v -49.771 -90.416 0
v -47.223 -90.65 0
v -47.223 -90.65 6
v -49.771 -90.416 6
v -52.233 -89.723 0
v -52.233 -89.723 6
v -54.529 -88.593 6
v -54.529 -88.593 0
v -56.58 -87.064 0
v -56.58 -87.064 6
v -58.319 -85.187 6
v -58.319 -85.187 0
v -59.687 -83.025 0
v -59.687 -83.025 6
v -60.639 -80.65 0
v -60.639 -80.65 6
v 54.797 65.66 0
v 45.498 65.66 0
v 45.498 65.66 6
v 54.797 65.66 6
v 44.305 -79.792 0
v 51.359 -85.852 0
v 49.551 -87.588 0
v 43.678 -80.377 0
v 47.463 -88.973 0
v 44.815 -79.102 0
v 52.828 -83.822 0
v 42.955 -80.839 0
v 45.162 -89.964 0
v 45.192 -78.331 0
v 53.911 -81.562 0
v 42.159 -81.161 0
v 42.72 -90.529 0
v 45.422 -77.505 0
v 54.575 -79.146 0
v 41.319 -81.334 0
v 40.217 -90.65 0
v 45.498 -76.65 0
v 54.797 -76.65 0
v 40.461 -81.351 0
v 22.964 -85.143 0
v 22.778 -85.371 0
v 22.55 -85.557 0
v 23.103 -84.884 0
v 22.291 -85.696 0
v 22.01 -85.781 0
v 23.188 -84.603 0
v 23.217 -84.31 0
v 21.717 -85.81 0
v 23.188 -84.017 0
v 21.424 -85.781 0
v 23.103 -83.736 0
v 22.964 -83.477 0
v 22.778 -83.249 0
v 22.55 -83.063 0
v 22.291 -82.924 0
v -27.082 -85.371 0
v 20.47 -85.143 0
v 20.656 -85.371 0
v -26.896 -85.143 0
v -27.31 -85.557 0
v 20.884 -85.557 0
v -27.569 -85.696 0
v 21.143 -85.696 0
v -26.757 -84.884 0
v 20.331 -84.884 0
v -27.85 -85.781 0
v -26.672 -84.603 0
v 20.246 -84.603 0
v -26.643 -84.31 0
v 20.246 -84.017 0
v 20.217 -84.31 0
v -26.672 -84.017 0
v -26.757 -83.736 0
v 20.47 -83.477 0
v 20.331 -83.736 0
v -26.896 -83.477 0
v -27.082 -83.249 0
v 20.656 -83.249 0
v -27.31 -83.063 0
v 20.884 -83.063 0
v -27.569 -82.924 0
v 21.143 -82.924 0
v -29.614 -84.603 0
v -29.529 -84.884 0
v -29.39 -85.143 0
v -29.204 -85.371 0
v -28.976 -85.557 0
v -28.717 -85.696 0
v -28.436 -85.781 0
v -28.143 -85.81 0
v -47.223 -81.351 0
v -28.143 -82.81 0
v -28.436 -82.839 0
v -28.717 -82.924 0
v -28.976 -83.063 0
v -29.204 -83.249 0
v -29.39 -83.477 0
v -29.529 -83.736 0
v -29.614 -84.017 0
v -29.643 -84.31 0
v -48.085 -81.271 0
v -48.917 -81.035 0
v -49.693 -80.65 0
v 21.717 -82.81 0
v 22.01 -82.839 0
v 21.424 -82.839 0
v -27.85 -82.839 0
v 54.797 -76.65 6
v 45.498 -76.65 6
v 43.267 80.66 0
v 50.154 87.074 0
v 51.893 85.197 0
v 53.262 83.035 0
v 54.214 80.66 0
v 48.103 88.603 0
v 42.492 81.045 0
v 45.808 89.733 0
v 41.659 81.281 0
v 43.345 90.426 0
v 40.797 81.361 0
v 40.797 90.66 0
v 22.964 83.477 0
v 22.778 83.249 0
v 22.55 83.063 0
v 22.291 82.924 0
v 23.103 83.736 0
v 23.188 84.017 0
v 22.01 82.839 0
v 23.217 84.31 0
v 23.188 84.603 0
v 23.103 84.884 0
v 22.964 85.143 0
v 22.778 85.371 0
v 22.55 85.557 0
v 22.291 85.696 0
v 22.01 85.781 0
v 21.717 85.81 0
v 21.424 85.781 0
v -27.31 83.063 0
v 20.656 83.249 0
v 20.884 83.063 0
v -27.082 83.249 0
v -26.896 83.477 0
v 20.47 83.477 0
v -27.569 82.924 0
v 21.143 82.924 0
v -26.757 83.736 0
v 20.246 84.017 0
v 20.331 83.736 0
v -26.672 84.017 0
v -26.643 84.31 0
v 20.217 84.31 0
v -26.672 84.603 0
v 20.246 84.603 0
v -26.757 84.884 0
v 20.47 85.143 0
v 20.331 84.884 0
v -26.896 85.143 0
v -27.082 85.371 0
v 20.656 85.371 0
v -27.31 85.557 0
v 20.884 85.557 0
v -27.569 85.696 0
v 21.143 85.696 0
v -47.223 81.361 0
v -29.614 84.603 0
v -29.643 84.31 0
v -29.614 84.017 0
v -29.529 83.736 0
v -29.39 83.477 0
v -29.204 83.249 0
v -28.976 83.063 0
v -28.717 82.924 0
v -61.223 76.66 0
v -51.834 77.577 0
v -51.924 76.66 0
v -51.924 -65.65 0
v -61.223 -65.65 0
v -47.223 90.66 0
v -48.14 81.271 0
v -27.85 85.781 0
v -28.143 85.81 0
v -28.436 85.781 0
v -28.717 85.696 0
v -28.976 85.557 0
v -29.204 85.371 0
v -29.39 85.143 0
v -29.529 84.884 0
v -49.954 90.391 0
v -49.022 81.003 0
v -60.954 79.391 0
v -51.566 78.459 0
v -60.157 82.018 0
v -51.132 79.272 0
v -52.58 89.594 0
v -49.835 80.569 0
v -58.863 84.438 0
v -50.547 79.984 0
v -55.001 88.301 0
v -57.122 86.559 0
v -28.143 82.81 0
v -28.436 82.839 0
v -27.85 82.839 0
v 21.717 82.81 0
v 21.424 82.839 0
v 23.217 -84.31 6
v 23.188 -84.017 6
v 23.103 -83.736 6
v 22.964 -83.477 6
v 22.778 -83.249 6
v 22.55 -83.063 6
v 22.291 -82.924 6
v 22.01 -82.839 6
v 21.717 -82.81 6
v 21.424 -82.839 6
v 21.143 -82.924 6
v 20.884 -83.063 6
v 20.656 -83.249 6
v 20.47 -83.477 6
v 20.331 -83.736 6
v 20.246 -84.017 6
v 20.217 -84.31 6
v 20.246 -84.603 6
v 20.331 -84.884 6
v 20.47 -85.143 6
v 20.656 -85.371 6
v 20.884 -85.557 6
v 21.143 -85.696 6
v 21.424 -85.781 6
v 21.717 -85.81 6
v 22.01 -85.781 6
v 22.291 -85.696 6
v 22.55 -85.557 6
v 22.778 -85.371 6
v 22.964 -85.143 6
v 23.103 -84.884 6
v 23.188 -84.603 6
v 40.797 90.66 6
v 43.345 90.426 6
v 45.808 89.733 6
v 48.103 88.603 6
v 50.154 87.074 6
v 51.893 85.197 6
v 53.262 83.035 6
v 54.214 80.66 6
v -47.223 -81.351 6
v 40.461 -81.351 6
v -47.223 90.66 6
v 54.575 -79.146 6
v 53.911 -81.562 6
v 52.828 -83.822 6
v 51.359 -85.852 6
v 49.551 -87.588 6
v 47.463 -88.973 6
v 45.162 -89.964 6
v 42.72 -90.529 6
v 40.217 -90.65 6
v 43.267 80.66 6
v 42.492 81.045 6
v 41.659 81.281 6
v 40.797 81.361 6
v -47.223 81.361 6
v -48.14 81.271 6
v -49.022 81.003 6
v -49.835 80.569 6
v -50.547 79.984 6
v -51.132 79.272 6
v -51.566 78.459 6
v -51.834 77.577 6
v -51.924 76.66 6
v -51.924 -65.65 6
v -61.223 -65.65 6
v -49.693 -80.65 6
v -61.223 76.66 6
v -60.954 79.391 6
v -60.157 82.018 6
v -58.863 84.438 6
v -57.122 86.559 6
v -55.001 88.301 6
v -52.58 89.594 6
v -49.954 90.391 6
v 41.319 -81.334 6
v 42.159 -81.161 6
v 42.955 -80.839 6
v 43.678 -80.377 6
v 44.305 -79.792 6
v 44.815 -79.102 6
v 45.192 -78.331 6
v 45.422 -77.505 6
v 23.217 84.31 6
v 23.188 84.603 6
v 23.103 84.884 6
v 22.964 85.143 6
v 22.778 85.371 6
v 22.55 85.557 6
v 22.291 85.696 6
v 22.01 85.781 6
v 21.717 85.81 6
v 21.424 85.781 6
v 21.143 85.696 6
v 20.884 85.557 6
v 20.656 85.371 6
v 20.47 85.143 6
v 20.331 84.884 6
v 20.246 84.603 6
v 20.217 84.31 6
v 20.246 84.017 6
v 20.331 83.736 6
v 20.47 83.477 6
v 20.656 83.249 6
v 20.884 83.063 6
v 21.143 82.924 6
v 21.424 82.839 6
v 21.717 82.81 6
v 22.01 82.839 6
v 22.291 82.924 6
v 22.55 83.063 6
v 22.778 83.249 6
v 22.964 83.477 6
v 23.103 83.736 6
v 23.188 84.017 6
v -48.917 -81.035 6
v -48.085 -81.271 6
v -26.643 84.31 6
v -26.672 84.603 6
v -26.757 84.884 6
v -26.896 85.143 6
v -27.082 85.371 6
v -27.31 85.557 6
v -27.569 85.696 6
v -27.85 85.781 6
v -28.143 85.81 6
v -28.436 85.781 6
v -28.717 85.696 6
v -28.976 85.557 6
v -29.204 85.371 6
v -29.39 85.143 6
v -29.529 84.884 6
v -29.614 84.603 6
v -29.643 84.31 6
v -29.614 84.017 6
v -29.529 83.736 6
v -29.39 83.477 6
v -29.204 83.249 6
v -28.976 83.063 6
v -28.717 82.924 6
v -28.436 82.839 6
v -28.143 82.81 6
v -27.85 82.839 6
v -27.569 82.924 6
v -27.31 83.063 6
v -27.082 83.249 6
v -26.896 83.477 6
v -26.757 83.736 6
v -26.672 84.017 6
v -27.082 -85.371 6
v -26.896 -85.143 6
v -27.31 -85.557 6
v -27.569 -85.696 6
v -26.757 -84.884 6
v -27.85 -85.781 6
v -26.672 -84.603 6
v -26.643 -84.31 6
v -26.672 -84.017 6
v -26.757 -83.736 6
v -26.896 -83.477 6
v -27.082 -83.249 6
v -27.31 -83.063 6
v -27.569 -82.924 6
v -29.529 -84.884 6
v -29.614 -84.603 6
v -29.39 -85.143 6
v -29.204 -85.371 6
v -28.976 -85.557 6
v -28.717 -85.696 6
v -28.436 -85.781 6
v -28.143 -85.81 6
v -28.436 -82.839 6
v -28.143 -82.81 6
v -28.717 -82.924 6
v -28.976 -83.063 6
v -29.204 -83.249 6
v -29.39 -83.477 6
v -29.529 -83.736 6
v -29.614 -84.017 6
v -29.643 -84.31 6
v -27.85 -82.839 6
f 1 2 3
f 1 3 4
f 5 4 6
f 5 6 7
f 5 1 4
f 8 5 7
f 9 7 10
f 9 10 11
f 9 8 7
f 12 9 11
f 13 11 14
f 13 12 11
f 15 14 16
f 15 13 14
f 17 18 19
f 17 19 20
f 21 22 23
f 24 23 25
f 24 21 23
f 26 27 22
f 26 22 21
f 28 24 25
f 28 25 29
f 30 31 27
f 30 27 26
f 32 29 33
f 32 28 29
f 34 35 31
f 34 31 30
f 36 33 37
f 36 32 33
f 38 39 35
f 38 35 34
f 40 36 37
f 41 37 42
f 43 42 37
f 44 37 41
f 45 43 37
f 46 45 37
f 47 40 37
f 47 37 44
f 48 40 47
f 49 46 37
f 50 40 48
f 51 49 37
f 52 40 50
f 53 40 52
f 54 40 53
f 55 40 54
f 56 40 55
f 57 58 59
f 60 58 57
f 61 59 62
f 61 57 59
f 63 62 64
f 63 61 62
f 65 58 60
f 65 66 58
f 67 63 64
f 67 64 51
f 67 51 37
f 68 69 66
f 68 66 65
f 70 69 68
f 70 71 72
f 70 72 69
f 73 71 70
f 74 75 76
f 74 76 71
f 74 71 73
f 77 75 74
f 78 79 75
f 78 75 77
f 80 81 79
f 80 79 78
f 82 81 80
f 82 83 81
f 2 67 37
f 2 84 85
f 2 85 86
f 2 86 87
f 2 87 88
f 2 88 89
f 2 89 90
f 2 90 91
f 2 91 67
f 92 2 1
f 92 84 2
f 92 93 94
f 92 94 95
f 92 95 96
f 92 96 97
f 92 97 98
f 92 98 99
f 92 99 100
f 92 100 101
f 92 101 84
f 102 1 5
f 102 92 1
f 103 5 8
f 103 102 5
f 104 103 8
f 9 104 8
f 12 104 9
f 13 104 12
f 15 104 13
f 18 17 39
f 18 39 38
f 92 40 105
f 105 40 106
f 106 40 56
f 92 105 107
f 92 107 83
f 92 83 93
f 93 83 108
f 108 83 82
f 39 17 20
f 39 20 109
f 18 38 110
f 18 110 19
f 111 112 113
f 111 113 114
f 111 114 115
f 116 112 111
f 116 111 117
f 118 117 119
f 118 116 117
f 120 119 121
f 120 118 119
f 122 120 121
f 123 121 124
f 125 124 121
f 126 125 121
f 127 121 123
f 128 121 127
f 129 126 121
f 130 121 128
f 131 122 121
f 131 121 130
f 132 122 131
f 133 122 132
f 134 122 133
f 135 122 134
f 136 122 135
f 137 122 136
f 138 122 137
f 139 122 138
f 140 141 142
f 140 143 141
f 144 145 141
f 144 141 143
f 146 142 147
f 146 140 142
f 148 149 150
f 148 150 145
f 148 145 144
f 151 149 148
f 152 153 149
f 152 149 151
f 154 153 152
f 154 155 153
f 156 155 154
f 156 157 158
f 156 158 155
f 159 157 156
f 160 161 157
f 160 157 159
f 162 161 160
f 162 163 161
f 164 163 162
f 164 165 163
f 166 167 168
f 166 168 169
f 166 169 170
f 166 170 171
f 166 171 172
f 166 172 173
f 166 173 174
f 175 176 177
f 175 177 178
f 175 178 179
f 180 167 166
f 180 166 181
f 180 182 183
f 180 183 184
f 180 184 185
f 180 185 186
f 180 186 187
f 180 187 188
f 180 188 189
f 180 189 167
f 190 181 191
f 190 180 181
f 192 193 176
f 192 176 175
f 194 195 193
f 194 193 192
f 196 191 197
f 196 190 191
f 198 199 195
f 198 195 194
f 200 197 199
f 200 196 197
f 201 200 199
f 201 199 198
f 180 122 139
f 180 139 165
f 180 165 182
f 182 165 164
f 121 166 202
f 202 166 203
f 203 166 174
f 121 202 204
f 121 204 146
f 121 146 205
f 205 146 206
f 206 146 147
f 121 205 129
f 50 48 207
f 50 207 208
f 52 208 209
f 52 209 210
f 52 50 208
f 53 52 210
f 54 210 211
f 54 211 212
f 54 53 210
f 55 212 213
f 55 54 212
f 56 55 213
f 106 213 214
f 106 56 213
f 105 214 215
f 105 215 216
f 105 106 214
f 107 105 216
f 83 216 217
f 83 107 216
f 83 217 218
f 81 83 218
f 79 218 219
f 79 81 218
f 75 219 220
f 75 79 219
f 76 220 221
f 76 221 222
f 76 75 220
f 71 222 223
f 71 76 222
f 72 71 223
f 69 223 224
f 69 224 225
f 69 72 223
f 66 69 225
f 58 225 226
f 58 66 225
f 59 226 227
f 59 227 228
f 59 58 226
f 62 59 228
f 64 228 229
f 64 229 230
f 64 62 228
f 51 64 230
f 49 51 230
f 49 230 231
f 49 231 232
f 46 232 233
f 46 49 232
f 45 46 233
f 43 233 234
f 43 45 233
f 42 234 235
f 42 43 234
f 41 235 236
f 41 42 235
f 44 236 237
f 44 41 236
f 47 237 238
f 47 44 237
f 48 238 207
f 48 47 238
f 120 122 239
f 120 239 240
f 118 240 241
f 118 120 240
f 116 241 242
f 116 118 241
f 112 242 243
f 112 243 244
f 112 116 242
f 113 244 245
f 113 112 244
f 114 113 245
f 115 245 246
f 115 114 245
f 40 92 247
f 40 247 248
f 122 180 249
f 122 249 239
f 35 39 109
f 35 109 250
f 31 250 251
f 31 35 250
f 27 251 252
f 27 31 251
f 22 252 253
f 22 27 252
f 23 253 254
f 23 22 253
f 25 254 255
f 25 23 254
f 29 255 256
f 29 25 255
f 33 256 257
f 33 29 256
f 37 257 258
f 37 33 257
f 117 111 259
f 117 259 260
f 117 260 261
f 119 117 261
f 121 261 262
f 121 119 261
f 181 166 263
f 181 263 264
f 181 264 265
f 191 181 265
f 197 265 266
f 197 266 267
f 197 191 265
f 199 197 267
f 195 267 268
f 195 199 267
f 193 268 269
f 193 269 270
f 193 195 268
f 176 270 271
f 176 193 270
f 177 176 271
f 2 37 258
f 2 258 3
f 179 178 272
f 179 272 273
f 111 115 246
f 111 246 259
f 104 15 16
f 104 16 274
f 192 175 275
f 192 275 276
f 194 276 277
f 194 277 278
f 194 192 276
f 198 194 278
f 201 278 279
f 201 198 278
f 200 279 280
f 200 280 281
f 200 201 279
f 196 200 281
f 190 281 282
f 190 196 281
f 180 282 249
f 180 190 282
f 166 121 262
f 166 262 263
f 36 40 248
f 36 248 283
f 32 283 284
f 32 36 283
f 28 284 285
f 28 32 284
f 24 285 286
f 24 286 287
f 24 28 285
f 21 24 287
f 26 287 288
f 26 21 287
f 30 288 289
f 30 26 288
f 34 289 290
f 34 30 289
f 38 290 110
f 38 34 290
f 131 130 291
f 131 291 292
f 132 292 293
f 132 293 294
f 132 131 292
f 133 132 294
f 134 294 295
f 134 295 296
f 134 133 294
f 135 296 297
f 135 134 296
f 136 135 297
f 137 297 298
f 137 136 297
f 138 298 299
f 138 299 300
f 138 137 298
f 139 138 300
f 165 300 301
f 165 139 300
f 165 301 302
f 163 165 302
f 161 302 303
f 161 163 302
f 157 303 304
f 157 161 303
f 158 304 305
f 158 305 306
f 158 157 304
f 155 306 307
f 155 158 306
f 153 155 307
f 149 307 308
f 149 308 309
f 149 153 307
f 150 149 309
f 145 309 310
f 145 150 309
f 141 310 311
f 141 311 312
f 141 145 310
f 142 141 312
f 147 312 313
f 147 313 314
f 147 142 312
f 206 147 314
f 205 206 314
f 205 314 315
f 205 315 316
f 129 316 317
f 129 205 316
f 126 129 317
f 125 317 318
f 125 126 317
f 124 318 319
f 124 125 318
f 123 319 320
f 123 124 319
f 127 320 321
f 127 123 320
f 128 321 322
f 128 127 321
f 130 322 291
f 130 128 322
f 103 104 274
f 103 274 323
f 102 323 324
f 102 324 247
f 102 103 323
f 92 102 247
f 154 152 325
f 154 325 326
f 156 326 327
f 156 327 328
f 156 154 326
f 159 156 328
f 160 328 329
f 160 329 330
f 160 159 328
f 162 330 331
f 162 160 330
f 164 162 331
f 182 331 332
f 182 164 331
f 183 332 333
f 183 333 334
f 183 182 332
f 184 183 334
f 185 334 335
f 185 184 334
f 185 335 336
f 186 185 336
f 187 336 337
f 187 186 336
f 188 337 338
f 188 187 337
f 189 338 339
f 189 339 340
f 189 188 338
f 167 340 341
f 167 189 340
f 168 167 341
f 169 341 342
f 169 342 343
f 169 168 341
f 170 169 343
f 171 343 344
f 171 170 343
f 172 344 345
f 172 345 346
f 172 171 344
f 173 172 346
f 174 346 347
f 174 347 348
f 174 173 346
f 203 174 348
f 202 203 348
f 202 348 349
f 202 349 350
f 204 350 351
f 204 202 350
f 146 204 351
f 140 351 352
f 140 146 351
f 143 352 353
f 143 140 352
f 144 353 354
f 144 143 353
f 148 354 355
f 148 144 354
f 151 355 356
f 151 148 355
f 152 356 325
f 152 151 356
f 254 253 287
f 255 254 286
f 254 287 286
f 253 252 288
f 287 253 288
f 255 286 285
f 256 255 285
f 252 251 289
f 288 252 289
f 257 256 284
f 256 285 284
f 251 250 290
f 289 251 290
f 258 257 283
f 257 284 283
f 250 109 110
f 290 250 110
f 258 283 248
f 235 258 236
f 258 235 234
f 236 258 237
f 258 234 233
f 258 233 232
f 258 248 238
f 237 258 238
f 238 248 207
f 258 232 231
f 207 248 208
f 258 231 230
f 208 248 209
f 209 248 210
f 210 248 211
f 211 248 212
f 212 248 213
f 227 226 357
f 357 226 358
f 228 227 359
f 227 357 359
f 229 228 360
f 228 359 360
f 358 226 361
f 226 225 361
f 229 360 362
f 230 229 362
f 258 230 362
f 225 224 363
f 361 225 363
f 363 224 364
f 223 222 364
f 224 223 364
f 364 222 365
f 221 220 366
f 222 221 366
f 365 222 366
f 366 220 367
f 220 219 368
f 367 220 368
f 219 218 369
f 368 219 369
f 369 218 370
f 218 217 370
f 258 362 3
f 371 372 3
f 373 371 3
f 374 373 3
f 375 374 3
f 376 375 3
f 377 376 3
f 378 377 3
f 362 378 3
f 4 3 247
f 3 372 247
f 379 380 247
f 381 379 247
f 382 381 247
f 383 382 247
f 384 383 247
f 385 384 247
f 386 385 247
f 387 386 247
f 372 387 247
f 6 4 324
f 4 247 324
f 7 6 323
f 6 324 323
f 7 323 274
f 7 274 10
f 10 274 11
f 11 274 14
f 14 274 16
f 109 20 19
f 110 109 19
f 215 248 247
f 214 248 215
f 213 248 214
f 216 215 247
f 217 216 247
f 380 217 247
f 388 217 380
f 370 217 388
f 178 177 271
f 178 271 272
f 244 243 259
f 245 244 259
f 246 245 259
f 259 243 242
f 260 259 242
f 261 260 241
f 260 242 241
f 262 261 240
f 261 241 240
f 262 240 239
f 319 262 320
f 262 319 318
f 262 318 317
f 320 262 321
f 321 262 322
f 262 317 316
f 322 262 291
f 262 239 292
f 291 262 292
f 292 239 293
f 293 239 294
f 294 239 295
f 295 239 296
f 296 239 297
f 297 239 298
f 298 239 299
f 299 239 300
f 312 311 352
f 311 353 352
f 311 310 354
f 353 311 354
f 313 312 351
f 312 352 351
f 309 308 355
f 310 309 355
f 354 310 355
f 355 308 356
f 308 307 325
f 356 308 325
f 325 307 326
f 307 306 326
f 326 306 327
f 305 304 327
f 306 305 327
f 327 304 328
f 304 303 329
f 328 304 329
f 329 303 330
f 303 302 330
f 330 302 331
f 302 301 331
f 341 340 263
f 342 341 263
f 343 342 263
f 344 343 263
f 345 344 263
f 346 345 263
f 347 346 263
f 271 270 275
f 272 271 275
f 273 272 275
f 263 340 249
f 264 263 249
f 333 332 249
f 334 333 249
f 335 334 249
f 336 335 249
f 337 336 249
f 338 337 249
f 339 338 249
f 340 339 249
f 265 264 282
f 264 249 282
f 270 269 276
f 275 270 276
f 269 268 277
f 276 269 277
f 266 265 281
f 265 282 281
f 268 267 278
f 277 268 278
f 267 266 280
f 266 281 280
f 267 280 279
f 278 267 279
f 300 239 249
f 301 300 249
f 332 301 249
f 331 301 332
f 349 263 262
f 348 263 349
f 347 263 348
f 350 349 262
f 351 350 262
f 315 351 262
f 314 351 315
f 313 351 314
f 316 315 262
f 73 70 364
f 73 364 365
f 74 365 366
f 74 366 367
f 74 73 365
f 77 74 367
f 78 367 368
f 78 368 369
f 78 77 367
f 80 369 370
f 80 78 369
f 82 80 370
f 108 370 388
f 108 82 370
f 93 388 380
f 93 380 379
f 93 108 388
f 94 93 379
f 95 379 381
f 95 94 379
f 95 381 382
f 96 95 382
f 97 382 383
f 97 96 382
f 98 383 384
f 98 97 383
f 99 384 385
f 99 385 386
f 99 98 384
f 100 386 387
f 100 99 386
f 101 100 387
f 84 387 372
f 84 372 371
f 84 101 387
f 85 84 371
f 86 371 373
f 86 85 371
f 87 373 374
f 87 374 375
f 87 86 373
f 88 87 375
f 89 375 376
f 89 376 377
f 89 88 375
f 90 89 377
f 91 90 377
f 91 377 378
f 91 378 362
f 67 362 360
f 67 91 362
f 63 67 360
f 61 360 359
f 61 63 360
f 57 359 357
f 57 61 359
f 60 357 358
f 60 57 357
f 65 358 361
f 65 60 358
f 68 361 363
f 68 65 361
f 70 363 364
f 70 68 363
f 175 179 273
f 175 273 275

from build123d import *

# Parameters (mm, degrees)
SKETCH1_R             = 1.5
BOSS_EXTRUDE1_DEPTH   = 6
BOSS_EXTRUDE1_2_DEPTH = 6


with BuildPart() as part:
    # Sketch1 → Boss-Extrude1 (new body)
    with BuildSketch(Plane.XY):
        with BuildLine():
            Line((-61.222874487, -65.65), (-61.222874487, 76.66))
            ThreePointArc((-61.222874487, 76.66), (-57.122369424, 86.559494937), (-47.222874487, 90.66))
            Line((-47.222874487, 90.66), (40.797125513, 90.66))
            ThreePointArc((40.797125513, 90.66), (49.163725778, 87.88497216), (54.213533378, 80.66))
            Line((54.213533378, 80.66), (43.266962857, 80.66))
            ThreePointArc((43.266962857, 80.66), (42.080831206, 81.182410441), (40.797125513, 81.361073974))
            Line((40.797125513, 81.361073974), (-47.222874487, 81.361073974))
            ThreePointArc((-47.222874487, 81.361073974), (-50.547035773, 79.984161286), (-51.923948461, 76.66))
            Line((-51.923948461, 76.66), (-51.923948461, -65.65))
            Line((-51.923948461, -65.65), (-61.222874487, -65.65))
        make_face()
        with Locations((21.717125513, 84.31)):
            Circle(SKETCH1_R, mode=Mode.SUBTRACT)
        with Locations((-28.142874487, 84.31)):
            Circle(SKETCH1_R, mode=Mode.SUBTRACT)
    extrude(amount=BOSS_EXTRUDE1_DEPTH)


with BuildPart() as body_2:
    # Sketch1 → Boss-Extrude1 2 (new body)
    with BuildSketch(Plane.XY):
        with BuildLine():
            Line((54.797125513, 65.66), (54.797125513, -76.65))
            ThreePointArc((54.797125513, -76.65), (50.493730236, -86.760334141), (40.217127352, -90.65))
            Line((40.217127352, -90.65), (-47.222872648, -90.65))
            ThreePointArc((-47.222872648, -90.65), (-55.589474015, -87.87497271), (-60.639282352, -80.65))
            Line((-60.639282352, -80.65), (-49.692731257, -80.65))
            ThreePointArc((-49.692731257, -80.65), (-48.506590033, -81.172418254), (-47.222872648, -81.35108418))
            Line((-47.222872648, -81.35108418), (40.461175806, -81.35108418))
            ThreePointArc((40.461175806, -81.35108418), (44.004715911, -80.098818879), (45.498199487, -76.65))
            Line((45.498199487, -76.65), (45.498199487, 65.66))
            Line((45.498199487, 65.66), (54.797125513, 65.66))
        make_face()
        with Locations((-28.142874487, -84.31)):
            Circle(SKETCH1_R, mode=Mode.SUBTRACT)
        with Locations((21.717125513, -84.31)):
            Circle(SKETCH1_R, mode=Mode.SUBTRACT)
    extrude(amount=BOSS_EXTRUDE1_2_DEPTH)


solid = Compound([part.part, body_2.part])
